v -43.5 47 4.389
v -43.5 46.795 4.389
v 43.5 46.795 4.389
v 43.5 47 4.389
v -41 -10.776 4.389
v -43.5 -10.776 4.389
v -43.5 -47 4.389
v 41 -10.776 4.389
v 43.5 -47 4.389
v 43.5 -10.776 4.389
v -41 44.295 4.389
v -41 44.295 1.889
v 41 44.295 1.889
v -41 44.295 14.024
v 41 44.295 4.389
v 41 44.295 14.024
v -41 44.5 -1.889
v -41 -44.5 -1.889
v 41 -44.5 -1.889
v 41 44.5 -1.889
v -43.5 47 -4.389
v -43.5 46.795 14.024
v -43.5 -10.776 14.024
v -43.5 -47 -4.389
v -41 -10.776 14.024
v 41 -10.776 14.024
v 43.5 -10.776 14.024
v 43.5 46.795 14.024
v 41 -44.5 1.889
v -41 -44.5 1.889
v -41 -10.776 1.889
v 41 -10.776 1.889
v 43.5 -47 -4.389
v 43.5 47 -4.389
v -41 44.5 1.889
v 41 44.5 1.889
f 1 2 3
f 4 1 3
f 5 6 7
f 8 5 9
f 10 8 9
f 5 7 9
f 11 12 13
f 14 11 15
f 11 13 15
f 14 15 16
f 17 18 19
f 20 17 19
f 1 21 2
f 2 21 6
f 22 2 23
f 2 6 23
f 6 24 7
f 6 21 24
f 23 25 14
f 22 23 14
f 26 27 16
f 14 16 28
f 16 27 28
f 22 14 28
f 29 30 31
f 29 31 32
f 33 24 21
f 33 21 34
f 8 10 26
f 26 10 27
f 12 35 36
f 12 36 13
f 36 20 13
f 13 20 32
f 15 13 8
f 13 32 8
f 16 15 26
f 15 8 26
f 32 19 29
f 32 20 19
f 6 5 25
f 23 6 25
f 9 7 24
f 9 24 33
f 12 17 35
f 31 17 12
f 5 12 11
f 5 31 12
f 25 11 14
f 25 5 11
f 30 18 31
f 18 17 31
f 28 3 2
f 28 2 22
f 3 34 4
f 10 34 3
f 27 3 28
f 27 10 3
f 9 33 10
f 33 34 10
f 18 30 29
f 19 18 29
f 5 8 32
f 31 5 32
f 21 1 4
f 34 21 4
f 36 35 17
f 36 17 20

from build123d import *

# Parameters (mm, degrees)
F0_W          = 87
F0_H          = 8.7780428881
F1_DEPTH      = 47
F1_DEPTH_BACK = 47
F2_W          = 57.5710088015
F2_H          = 14.0236988664
F3_DEPTH      = 43.5
F3_DEPTH_BACK = 43.5
F4_T          = 2.5
F4_T3_DEPTH   = 92


# Not quite as in the source:
# - a shell that OpenCascade refuses in one call is made with other operations: the cavity is built on its own and cut out
# - the program builds the solid bodies; features that only make, move or delete a surface that nothing else refers to are left out


with BuildPart() as f1:
    # F0 (on Front) → F1 (new body, two sides)
    with BuildSketch(Plane.XZ) as f1_sk:
        Rectangle(F0_W, F0_H)
    extrude(amount=F1_DEPTH)
    extrude(f1_sk.sketch, amount=-F1_DEPTH_BACK)

    # F2 (on Right) → F3 (join, two sides)
    with BuildSketch(Plane.YZ) as f3_sk:
        with Locations((18.0093571544, 7.0118494332)):
            Rectangle(F2_W, F2_H)
    extrude(amount=F3_DEPTH)
    extrude(f3_sk.sketch, amount=-F3_DEPTH_BACK)

    # F4: shell of thickness 2.5, made by hand


with BuildPart() as f4_core1:
    # F4_t2: copy of F1
    add(f1.part)

    # the walls: a layer under each face that stays
    f4_faces = [f4_core1.faces().sort_by_distance(p)[0] for p in [
        (-43.5, 0, 4.8173387112),
        (0, -28.8880736232, 4.3890214441),
        (0, 46.8974307775, 4.3890214441),
        (0, 47, 0),
        (0, 0, -4.3890214441),
        (0, -47, 0),
        (43.5, 0, 4.8173387112),
        (0, 46.7948615551, 9.2063601552),
    ]]
    thicken(f4_faces, amount=-F4_T, mode=Mode.SUBTRACT)

    # F4_s4 → F4_t3 (cut)
    with BuildSketch(Plane.YZ.offset(-46)):
        Polygon((46.8198615551, 4.4140214441), (46.7948615551, 1.8890214441), (44.2948615551, 1.8890214441), (44.2948615551, 4.3890214441), align=None)
    extrude(amount=F4_T3_DEPTH, mode=Mode.SUBTRACT)


with BuildPart() as f1_1:
    add(f1.part)

    # what is left inside the walls is the cavity
    f4_cavity = [f4_core1.part.solids().sort_by_distance(p)[0] for p in [
        (0, -14.833333, -1.864021),
    ]]
    add(f4_cavity, mode=Mode.SUBTRACT)


solid = f1_1.part
